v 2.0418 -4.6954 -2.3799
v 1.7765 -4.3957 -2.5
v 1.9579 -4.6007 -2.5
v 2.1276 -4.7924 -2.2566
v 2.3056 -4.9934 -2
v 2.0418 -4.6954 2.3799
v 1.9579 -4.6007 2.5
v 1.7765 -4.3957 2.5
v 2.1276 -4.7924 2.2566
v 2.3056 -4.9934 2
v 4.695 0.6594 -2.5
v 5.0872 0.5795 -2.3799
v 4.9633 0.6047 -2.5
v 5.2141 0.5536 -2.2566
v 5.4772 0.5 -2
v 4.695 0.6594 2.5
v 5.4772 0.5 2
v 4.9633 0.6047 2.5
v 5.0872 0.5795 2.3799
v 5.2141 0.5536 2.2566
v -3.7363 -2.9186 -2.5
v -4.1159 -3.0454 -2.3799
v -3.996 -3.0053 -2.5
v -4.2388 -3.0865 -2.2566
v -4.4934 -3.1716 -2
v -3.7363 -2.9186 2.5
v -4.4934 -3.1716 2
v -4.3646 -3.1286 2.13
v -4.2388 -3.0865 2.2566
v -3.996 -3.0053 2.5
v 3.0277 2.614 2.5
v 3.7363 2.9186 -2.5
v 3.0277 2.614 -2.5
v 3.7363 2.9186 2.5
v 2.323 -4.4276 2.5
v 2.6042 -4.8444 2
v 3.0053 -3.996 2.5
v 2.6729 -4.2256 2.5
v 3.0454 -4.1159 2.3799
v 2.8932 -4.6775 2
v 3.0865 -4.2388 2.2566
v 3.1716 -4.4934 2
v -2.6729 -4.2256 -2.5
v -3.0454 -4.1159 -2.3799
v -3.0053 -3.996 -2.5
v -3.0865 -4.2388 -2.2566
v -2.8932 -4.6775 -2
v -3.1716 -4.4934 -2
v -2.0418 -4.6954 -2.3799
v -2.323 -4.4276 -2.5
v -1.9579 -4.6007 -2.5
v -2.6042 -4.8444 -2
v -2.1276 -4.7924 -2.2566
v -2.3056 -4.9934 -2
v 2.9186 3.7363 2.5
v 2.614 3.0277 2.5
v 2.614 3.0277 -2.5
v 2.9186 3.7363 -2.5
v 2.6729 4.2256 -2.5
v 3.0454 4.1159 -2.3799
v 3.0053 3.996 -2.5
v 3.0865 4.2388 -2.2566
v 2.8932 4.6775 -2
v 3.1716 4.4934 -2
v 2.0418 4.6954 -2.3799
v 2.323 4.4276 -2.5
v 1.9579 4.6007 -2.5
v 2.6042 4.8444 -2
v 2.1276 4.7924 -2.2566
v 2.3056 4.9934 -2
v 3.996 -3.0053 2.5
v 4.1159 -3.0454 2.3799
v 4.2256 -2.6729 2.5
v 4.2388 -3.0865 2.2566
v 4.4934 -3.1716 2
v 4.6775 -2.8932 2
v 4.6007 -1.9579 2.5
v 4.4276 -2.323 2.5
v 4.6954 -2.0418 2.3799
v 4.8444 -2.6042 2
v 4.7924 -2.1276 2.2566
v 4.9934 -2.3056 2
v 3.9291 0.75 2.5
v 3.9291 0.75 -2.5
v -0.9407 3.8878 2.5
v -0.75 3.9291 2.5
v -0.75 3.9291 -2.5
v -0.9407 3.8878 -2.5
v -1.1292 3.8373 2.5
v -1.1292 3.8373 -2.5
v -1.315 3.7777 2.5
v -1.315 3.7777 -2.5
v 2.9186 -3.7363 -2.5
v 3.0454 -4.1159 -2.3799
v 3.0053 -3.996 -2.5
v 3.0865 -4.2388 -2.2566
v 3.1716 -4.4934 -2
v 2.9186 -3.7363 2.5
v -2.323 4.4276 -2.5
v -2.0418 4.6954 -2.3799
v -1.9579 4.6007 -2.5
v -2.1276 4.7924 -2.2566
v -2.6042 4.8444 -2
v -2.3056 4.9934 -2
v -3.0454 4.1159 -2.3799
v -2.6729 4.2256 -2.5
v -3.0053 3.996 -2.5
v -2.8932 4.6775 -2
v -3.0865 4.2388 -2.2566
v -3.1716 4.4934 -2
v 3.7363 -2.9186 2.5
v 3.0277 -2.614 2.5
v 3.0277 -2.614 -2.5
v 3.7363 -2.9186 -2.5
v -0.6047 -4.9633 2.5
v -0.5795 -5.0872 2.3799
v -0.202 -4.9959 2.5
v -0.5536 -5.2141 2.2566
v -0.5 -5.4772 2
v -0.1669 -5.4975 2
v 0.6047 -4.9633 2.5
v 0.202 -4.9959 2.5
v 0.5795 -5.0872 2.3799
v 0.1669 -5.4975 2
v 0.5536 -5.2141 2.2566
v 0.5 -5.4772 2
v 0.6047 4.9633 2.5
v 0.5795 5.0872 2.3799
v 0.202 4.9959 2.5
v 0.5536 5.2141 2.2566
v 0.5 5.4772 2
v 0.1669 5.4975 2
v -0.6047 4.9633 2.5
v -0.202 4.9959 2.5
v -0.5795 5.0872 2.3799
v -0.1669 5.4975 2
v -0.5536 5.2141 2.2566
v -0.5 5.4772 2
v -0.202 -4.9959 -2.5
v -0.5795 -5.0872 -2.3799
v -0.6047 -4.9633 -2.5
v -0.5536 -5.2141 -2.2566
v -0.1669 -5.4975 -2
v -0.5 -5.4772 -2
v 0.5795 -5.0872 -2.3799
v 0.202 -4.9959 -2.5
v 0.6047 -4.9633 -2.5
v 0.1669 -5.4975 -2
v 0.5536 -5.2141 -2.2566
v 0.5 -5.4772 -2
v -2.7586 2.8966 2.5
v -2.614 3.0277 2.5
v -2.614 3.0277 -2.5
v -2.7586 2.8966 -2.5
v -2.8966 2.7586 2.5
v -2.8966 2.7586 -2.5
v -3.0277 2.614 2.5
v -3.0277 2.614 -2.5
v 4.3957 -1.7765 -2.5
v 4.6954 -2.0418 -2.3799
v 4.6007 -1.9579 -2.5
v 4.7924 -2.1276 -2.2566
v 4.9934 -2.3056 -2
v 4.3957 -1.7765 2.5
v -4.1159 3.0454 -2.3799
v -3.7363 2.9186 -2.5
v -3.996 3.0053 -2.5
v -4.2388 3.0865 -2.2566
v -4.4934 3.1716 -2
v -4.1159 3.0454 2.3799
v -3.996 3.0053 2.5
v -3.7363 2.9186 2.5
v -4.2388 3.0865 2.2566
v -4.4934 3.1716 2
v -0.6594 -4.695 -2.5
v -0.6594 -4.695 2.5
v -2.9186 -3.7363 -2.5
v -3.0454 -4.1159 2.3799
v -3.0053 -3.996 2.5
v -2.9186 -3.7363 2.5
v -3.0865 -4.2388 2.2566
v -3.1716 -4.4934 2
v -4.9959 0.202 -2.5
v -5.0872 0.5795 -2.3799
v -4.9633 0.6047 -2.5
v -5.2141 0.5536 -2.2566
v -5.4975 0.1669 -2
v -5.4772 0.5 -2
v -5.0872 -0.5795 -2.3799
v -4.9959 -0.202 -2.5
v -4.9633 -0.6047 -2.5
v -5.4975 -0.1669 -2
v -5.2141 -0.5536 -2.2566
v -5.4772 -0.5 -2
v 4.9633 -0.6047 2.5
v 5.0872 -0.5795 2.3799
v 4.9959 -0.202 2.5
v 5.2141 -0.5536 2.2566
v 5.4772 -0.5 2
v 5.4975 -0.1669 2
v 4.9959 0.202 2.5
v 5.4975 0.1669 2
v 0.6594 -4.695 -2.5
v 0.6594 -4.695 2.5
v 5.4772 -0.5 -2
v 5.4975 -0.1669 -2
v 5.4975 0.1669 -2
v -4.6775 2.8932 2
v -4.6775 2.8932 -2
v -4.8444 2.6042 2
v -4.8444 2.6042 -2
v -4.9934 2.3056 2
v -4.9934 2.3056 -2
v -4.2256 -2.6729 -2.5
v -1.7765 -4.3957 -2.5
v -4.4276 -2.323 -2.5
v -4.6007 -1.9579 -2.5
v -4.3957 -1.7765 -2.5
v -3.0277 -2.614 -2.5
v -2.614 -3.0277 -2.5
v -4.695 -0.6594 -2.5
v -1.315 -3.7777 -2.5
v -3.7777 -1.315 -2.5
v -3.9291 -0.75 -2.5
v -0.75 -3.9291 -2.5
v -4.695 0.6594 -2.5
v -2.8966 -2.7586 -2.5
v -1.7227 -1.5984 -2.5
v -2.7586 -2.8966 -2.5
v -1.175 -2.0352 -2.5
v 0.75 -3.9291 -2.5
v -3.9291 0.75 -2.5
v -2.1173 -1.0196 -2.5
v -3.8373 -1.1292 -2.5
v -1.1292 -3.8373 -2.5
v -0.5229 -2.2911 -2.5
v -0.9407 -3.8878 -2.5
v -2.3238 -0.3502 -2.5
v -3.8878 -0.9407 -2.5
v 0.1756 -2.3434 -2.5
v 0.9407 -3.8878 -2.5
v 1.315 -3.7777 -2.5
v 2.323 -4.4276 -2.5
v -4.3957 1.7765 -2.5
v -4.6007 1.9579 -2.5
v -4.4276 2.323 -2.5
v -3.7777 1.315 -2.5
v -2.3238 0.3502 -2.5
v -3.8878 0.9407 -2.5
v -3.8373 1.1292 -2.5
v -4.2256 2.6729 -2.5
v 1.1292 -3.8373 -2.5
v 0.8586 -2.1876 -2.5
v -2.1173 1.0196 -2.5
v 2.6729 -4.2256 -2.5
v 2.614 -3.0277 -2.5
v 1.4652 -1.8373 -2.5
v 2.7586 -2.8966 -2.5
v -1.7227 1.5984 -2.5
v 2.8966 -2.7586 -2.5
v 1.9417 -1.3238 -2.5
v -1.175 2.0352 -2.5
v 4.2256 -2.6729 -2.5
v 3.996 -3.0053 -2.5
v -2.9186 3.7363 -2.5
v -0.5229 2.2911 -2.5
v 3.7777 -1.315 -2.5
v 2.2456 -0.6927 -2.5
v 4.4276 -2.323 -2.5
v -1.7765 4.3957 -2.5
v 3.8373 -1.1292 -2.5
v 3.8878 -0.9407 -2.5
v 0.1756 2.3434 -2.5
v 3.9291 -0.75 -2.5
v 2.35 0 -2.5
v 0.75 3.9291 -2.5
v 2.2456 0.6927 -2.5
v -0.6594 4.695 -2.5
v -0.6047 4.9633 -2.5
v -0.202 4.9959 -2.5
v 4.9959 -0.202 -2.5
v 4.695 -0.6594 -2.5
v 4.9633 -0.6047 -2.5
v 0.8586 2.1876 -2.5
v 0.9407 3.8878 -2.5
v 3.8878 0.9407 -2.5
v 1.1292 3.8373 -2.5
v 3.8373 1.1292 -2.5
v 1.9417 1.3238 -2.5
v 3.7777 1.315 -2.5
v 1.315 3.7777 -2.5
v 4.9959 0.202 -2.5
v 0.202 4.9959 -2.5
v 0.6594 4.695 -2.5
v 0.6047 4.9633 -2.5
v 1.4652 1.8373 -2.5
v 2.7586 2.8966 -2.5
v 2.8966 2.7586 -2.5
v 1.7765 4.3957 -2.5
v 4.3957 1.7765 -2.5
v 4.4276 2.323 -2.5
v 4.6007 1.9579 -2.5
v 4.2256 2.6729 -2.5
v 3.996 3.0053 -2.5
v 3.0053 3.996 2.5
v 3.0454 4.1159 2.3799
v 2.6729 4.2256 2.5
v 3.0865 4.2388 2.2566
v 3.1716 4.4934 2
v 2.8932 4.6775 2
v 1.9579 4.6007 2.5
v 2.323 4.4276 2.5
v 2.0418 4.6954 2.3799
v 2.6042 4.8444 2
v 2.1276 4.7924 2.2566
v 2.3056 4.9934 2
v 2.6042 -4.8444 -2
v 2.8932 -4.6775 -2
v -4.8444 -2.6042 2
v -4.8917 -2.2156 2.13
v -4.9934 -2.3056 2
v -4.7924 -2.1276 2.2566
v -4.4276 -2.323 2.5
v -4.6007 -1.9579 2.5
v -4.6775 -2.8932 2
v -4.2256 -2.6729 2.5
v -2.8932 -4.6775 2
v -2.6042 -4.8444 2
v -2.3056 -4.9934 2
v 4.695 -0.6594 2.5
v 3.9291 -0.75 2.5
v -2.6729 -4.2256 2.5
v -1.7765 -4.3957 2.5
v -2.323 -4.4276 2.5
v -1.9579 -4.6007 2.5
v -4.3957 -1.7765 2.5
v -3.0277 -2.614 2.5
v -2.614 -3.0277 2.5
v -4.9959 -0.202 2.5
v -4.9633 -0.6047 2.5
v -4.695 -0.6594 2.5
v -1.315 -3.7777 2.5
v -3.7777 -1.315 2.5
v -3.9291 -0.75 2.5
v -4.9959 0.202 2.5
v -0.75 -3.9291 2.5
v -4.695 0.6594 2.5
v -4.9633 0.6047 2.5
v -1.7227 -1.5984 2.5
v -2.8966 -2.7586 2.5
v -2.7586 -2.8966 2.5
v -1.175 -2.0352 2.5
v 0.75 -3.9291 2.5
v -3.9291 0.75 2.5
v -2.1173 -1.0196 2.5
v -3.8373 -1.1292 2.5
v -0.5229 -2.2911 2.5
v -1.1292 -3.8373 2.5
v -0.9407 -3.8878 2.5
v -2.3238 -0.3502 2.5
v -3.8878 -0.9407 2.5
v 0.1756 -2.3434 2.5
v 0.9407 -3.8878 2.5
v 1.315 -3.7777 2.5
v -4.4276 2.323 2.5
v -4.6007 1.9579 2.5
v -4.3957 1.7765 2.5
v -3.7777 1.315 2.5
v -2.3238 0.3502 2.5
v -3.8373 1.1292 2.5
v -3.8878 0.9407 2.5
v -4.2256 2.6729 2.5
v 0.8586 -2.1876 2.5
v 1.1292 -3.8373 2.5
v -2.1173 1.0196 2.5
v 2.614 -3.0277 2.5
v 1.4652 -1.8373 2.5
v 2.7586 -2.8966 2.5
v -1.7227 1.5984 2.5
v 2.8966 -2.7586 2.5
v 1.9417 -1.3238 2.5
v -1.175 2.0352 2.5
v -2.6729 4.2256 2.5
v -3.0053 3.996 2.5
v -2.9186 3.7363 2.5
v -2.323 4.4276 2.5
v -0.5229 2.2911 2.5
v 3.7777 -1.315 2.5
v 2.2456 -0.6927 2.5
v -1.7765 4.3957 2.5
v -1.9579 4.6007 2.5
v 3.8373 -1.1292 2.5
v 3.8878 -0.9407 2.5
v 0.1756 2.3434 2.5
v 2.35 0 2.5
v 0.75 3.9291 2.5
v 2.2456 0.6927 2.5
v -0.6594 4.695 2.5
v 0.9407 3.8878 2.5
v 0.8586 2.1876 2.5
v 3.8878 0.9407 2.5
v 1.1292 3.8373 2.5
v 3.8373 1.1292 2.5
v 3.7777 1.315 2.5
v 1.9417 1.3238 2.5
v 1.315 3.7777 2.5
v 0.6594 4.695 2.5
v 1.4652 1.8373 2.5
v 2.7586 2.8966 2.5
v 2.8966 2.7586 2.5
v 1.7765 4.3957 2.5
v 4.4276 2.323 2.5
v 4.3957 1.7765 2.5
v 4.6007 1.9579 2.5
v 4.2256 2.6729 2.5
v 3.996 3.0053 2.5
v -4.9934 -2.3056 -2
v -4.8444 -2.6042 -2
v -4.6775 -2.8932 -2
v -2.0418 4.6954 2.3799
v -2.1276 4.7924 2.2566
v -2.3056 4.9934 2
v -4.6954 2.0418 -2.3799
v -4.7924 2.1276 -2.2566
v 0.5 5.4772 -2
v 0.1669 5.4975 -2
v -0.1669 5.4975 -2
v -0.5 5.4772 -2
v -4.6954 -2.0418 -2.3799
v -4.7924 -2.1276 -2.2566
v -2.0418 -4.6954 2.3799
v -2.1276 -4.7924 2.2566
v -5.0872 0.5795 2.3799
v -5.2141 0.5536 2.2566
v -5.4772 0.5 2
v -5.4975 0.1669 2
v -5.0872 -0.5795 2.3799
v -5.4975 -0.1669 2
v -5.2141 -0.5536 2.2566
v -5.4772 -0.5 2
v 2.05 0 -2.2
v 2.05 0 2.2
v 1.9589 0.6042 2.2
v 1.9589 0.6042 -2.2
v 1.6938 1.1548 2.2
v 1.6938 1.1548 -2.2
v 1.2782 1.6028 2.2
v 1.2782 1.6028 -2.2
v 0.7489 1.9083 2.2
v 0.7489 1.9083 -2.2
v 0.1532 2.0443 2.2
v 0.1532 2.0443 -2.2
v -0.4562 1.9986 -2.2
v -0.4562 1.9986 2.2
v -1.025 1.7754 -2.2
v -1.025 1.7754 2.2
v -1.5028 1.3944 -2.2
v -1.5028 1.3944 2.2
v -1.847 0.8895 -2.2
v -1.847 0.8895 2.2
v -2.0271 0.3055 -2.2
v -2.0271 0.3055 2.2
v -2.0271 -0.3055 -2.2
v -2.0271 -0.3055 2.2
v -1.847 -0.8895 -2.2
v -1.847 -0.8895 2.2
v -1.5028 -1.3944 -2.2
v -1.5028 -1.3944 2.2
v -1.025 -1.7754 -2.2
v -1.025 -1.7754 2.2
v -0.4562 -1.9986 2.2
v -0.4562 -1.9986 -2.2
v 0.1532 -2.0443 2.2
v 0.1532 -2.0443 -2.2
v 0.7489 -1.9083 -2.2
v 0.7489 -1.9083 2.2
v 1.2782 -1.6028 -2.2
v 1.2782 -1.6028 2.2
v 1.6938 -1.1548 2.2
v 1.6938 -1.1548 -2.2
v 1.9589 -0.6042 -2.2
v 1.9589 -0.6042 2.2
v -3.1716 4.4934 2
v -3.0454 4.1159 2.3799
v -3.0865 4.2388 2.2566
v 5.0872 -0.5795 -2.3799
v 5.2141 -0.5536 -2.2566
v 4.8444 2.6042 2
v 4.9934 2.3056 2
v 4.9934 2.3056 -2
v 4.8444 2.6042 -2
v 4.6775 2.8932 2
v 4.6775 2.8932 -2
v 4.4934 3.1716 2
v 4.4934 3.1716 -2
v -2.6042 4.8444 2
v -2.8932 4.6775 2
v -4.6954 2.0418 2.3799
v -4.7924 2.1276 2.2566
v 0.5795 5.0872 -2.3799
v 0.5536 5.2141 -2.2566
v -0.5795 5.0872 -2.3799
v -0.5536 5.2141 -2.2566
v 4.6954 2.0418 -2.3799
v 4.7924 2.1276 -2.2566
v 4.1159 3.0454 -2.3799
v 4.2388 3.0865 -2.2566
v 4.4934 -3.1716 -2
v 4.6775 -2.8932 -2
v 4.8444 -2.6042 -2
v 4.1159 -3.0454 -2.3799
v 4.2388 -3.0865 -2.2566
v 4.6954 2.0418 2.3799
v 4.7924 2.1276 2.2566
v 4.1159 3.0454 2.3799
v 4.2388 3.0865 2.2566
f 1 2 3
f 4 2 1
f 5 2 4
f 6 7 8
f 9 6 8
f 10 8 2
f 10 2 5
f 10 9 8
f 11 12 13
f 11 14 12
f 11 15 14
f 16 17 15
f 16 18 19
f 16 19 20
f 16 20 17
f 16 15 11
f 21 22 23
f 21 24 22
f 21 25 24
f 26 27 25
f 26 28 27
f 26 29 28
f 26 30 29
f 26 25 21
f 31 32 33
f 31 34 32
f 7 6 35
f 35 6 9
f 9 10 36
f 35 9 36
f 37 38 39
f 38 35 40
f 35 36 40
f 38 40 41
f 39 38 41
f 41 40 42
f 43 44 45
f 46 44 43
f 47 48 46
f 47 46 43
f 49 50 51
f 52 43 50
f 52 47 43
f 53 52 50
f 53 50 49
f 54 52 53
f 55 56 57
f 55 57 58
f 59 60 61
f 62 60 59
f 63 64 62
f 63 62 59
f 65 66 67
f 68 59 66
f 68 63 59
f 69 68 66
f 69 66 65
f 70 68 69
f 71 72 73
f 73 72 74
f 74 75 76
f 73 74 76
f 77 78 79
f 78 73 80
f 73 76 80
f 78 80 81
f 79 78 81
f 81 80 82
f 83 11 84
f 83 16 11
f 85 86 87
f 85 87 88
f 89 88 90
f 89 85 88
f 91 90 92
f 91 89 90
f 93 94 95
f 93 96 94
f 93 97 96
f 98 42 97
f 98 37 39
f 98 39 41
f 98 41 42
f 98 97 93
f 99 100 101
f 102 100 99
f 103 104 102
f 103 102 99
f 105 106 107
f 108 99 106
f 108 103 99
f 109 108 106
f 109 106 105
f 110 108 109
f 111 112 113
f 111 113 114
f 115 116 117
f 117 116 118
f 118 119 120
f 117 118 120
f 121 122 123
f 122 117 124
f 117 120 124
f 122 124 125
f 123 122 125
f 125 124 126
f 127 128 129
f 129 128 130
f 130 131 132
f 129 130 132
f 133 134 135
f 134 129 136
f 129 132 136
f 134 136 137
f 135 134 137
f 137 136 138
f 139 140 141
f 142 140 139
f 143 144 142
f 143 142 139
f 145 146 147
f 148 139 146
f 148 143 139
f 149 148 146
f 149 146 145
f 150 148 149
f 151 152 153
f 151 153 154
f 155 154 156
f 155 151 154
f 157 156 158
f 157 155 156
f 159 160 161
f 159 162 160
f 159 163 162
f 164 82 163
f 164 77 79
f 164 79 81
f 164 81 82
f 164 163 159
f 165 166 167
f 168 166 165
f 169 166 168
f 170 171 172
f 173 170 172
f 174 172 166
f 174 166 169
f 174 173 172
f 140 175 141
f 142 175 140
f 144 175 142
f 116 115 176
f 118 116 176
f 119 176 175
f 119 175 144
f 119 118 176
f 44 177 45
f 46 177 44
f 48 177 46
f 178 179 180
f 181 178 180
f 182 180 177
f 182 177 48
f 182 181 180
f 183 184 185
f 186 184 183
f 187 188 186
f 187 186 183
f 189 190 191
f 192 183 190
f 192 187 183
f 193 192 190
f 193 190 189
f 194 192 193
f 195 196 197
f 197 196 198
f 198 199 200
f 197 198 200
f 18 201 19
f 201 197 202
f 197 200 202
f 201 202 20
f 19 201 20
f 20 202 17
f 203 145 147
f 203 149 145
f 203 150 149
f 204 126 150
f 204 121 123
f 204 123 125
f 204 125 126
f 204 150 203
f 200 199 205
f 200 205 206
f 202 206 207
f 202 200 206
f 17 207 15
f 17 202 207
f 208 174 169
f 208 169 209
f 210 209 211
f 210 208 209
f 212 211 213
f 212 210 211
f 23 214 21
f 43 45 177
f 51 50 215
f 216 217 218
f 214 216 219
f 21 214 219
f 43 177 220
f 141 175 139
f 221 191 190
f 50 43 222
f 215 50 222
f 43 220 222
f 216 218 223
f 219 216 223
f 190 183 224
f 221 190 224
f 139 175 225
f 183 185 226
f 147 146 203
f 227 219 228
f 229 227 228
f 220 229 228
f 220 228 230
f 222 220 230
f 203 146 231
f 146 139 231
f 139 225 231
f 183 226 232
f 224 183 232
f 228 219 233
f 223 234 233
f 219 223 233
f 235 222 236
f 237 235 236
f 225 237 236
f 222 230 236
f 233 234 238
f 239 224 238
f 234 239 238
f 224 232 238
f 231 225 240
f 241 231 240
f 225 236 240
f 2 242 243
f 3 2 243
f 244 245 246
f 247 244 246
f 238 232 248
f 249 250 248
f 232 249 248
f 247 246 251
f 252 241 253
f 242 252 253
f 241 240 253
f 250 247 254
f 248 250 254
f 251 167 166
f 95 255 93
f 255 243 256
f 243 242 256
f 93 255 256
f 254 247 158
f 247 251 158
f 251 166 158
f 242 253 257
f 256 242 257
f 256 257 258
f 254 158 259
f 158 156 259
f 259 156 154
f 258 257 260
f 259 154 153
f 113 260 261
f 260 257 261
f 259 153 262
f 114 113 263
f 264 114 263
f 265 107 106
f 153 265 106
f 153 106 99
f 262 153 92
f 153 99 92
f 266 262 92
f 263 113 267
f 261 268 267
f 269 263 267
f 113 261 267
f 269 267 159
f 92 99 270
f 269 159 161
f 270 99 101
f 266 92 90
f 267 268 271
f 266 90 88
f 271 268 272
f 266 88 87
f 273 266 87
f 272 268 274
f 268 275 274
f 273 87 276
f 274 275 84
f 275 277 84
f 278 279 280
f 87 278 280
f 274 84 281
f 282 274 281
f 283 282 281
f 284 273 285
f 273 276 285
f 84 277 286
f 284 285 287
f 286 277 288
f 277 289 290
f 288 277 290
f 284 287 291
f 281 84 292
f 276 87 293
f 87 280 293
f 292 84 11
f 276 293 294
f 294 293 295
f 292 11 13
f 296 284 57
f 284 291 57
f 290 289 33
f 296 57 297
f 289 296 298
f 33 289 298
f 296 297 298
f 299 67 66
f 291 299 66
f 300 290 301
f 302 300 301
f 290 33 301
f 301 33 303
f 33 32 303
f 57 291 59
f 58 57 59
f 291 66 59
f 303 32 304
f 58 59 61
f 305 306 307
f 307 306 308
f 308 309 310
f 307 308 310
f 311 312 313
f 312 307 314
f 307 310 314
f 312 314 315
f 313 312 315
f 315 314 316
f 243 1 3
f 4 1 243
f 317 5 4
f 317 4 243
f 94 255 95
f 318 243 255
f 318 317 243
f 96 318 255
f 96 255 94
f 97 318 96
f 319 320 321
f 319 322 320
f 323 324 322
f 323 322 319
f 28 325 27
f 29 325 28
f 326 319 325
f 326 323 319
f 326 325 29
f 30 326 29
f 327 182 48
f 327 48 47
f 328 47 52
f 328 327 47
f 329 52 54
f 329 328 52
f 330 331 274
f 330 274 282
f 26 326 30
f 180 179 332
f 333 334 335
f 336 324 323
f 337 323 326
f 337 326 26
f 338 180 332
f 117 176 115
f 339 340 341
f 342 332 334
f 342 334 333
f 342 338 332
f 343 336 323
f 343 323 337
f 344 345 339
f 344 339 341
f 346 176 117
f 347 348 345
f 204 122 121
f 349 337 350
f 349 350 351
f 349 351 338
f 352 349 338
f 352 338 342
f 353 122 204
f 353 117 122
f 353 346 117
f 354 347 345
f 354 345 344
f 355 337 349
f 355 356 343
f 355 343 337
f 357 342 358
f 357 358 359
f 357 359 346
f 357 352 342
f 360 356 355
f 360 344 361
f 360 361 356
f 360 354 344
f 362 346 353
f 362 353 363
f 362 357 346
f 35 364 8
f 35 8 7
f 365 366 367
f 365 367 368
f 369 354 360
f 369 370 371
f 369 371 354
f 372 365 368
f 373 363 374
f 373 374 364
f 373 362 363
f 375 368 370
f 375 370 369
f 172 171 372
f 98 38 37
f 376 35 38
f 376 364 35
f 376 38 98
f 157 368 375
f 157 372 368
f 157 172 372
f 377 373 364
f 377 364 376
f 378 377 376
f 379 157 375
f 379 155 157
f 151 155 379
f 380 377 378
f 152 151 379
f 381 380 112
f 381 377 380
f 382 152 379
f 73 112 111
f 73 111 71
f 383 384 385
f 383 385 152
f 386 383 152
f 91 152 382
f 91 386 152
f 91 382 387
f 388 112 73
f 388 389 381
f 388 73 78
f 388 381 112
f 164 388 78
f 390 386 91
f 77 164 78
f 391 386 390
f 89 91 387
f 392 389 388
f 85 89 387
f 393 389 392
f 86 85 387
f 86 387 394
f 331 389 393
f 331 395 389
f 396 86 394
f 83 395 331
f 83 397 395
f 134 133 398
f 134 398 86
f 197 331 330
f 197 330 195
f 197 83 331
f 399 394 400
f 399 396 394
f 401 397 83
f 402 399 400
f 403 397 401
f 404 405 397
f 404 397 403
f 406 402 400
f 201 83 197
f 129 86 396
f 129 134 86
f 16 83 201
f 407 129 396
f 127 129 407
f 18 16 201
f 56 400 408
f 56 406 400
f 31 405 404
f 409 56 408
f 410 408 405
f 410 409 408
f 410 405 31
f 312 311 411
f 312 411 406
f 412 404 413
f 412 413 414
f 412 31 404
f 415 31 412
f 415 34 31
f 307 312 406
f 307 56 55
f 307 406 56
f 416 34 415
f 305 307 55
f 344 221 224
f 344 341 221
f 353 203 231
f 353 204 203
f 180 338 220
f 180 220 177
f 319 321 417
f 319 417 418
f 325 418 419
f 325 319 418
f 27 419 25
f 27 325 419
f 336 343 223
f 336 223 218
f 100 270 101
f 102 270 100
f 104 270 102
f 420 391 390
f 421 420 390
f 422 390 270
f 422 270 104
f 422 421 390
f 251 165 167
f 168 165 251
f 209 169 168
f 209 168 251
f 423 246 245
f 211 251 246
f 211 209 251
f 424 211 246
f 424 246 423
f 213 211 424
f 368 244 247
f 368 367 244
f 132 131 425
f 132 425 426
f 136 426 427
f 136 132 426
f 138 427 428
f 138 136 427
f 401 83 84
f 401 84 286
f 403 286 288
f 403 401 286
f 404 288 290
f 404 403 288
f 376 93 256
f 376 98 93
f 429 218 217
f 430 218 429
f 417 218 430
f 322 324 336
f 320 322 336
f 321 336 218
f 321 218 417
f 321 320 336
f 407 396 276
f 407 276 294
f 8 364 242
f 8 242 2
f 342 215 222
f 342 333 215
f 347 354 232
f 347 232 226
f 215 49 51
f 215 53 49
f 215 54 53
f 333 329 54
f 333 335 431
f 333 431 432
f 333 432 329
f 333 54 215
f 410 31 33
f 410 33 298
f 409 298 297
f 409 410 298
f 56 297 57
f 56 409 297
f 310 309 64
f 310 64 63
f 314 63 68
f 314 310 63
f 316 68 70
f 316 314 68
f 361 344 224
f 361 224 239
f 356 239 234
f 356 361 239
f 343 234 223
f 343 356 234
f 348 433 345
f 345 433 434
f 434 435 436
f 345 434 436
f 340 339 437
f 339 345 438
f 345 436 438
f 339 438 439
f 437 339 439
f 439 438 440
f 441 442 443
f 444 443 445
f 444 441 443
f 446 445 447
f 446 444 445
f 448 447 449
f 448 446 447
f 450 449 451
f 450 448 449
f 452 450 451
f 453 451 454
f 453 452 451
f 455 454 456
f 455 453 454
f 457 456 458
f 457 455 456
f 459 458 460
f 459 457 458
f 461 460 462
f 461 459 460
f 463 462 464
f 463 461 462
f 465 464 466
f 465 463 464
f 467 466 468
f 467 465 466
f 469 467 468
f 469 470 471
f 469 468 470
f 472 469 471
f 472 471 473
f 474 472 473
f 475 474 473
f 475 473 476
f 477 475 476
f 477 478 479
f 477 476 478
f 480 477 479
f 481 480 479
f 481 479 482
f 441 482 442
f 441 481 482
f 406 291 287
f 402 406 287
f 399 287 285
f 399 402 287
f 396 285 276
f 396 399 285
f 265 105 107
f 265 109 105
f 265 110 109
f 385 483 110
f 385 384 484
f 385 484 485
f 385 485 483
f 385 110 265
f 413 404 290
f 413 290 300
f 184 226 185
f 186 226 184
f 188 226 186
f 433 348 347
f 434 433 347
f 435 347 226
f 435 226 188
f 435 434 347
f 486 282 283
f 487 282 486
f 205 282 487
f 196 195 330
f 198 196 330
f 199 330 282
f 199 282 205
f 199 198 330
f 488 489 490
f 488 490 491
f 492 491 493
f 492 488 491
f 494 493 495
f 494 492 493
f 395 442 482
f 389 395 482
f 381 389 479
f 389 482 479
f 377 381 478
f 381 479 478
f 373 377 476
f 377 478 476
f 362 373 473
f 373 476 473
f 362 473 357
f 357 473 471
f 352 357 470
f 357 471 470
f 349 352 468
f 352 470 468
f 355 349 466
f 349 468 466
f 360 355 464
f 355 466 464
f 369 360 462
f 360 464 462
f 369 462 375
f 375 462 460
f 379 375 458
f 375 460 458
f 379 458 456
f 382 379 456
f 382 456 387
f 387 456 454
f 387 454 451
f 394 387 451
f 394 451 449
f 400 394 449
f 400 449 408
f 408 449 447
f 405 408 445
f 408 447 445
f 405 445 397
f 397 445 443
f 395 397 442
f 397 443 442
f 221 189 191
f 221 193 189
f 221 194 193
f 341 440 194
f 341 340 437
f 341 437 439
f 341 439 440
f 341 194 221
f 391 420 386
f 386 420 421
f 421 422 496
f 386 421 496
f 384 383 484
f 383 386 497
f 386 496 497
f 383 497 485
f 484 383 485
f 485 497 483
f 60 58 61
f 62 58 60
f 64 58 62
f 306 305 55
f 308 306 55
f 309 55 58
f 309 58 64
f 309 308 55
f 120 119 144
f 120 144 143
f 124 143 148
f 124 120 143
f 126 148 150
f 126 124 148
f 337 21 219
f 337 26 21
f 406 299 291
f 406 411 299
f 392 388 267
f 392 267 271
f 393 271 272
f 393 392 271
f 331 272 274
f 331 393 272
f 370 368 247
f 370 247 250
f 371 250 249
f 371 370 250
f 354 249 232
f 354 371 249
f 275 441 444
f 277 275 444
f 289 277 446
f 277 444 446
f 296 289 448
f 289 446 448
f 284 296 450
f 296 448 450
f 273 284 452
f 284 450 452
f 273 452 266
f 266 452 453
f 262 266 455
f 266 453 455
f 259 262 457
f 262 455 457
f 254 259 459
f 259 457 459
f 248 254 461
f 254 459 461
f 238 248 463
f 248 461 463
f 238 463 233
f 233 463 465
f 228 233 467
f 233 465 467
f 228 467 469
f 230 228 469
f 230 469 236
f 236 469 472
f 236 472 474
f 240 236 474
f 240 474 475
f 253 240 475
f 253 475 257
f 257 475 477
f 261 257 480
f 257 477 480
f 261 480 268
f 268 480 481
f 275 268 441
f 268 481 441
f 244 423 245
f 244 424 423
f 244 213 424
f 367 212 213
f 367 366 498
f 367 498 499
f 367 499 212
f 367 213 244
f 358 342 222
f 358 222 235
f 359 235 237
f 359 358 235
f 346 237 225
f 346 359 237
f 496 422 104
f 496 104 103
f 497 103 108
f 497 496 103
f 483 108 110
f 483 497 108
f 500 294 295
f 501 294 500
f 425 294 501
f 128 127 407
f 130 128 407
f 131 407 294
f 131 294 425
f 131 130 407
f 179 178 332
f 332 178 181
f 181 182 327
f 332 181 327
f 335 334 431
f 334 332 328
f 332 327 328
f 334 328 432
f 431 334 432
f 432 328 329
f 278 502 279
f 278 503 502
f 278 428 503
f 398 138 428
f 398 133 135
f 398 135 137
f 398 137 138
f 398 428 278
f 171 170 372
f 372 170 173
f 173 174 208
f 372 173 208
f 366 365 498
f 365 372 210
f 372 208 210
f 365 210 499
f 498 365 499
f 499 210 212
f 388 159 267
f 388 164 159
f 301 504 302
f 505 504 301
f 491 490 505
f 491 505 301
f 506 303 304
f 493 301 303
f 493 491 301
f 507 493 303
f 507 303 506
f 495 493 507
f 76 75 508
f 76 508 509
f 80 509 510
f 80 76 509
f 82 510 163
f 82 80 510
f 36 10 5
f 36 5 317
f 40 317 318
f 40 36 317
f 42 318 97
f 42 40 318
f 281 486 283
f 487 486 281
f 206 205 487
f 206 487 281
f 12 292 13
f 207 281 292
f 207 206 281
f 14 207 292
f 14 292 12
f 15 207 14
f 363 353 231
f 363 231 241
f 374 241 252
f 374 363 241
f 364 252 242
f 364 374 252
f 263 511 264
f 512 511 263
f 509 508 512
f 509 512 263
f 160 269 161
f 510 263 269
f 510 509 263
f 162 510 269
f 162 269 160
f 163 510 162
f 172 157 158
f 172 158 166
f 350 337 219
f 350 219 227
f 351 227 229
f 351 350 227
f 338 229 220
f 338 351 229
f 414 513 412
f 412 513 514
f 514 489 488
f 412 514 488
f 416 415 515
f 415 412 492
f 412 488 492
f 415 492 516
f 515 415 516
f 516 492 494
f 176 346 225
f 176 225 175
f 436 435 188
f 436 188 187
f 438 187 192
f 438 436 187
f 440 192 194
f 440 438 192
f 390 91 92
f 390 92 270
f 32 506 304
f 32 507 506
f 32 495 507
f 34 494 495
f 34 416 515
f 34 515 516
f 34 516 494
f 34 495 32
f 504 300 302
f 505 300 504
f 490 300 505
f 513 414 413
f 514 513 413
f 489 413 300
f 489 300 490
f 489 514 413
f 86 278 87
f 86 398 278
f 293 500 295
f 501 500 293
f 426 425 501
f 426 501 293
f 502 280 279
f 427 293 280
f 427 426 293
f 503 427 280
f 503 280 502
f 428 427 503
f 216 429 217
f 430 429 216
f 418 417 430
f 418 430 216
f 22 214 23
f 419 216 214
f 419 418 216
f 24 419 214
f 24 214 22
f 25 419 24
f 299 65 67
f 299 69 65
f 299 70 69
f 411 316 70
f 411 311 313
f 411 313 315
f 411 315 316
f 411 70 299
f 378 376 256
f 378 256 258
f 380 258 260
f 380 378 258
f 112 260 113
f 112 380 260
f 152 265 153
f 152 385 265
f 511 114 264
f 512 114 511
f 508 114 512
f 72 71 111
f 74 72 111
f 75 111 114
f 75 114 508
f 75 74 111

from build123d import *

# Parameters (mm, degrees)
SKETCH_1_R               = 2.05
EXTRUDE_1_DEPTH          = 2.5
PATTERN_CIRCULAR_1_COUNT = 12
CHAMFER_1_SIZE           = 0.5
CHAMFER_2_SIZE           = 0.5
CHAMFER_3_SIZE           = 0.3


with BuildPart() as part:
    # 스케치1 → 보스-돌출1 (new, symmetric)
    with BuildSketch(Plane.XY):
        with BuildLine():
            ThreePointArc((-0.75, 3.929058411), (0, -4), (0.75, 3.929058411))
            Line((0.75, 3.929058411), (0.659376088, 4.695031864))
            Line((0.659376088, 4.695031864), (0.5, 5.477225575))
            ThreePointArc((0.5, 5.477225575), (0, 5.5), (-0.5, 5.477225575))
            Line((-0.5, 5.477225575), (-0.659376088, 4.695031864))
            Line((-0.659376088, 4.695031864), (-0.75, 3.929058411))
        make_face()
        Circle(SKETCH_1_R, mode=Mode.SUBTRACT)
    extrude_1 = extrude(amount=EXTRUDE_1_DEPTH, both=True)

    # 원형 패턴1: 보스-돌출1 ×12 about axis
    pattern_circular_1_axis = Axis((0, 0, 0), (0, 0, 1))
    for i in range(1, PATTERN_CIRCULAR_1_COUNT):
        add(extrude_1.rotate(pattern_circular_1_axis, i * 360 / PATTERN_CIRCULAR_1_COUNT))

    # 모따기1
    chamfer_1_edges = [part.edges().sort_by_distance(p)[0] for p in [
        (0, 5.5, -2.5),
        (2.75, 4.763139721, -2.5),
        (5.5, 0, -2.5),
        (2.75, -4.763139721, -2.5),
        (-2.75, -4.763139721, -2.5),
        (-5.5, 0, -2.5),
        (-2.75, 4.763139721, -2.5),
        (-4.763139721, 2.75, -2.5),
        (-4.763139721, -2.75, -2.5),
        (0, -5.5, -2.5),
        (4.763139721, -2.75, -2.5),
        (4.763139721, 2.75, -2.5),
    ]]
    chamfer(chamfer_1_edges, length=CHAMFER_1_SIZE)

    # 모따기2
    chamfer_2_edges = [part.edges().sort_by_distance(p)[0] for p in [
        (4.763139721, 2.75, 2.5),
        (2.75, 4.763139721, 2.5),
        (0, 5.5, 2.5),
        (-2.75, 4.763139721, 2.5),
        (-4.763139721, 2.75, 2.5),
        (-5.5, 0, 2.5),
        (-4.763139721, -2.75, 2.5),
        (-2.75, -4.763139721, 2.5),
        (0, -5.5, 2.5),
        (2.75, -4.763139721, 2.5),
        (4.763139721, -2.75, 2.5),
        (5.5, 0, 2.5),
    ]]
    chamfer(chamfer_2_edges, length=CHAMFER_2_SIZE)

    # 모따기3
    chamfer_3_edges = [part.edges().sort_by_distance(p)[0] for p in [
        (-2.05, 0, 2.5),
        (-2.05, 0, -2.5),
    ]]
    chamfer(chamfer_3_edges, length=CHAMFER_3_SIZE)


solid = part.part
